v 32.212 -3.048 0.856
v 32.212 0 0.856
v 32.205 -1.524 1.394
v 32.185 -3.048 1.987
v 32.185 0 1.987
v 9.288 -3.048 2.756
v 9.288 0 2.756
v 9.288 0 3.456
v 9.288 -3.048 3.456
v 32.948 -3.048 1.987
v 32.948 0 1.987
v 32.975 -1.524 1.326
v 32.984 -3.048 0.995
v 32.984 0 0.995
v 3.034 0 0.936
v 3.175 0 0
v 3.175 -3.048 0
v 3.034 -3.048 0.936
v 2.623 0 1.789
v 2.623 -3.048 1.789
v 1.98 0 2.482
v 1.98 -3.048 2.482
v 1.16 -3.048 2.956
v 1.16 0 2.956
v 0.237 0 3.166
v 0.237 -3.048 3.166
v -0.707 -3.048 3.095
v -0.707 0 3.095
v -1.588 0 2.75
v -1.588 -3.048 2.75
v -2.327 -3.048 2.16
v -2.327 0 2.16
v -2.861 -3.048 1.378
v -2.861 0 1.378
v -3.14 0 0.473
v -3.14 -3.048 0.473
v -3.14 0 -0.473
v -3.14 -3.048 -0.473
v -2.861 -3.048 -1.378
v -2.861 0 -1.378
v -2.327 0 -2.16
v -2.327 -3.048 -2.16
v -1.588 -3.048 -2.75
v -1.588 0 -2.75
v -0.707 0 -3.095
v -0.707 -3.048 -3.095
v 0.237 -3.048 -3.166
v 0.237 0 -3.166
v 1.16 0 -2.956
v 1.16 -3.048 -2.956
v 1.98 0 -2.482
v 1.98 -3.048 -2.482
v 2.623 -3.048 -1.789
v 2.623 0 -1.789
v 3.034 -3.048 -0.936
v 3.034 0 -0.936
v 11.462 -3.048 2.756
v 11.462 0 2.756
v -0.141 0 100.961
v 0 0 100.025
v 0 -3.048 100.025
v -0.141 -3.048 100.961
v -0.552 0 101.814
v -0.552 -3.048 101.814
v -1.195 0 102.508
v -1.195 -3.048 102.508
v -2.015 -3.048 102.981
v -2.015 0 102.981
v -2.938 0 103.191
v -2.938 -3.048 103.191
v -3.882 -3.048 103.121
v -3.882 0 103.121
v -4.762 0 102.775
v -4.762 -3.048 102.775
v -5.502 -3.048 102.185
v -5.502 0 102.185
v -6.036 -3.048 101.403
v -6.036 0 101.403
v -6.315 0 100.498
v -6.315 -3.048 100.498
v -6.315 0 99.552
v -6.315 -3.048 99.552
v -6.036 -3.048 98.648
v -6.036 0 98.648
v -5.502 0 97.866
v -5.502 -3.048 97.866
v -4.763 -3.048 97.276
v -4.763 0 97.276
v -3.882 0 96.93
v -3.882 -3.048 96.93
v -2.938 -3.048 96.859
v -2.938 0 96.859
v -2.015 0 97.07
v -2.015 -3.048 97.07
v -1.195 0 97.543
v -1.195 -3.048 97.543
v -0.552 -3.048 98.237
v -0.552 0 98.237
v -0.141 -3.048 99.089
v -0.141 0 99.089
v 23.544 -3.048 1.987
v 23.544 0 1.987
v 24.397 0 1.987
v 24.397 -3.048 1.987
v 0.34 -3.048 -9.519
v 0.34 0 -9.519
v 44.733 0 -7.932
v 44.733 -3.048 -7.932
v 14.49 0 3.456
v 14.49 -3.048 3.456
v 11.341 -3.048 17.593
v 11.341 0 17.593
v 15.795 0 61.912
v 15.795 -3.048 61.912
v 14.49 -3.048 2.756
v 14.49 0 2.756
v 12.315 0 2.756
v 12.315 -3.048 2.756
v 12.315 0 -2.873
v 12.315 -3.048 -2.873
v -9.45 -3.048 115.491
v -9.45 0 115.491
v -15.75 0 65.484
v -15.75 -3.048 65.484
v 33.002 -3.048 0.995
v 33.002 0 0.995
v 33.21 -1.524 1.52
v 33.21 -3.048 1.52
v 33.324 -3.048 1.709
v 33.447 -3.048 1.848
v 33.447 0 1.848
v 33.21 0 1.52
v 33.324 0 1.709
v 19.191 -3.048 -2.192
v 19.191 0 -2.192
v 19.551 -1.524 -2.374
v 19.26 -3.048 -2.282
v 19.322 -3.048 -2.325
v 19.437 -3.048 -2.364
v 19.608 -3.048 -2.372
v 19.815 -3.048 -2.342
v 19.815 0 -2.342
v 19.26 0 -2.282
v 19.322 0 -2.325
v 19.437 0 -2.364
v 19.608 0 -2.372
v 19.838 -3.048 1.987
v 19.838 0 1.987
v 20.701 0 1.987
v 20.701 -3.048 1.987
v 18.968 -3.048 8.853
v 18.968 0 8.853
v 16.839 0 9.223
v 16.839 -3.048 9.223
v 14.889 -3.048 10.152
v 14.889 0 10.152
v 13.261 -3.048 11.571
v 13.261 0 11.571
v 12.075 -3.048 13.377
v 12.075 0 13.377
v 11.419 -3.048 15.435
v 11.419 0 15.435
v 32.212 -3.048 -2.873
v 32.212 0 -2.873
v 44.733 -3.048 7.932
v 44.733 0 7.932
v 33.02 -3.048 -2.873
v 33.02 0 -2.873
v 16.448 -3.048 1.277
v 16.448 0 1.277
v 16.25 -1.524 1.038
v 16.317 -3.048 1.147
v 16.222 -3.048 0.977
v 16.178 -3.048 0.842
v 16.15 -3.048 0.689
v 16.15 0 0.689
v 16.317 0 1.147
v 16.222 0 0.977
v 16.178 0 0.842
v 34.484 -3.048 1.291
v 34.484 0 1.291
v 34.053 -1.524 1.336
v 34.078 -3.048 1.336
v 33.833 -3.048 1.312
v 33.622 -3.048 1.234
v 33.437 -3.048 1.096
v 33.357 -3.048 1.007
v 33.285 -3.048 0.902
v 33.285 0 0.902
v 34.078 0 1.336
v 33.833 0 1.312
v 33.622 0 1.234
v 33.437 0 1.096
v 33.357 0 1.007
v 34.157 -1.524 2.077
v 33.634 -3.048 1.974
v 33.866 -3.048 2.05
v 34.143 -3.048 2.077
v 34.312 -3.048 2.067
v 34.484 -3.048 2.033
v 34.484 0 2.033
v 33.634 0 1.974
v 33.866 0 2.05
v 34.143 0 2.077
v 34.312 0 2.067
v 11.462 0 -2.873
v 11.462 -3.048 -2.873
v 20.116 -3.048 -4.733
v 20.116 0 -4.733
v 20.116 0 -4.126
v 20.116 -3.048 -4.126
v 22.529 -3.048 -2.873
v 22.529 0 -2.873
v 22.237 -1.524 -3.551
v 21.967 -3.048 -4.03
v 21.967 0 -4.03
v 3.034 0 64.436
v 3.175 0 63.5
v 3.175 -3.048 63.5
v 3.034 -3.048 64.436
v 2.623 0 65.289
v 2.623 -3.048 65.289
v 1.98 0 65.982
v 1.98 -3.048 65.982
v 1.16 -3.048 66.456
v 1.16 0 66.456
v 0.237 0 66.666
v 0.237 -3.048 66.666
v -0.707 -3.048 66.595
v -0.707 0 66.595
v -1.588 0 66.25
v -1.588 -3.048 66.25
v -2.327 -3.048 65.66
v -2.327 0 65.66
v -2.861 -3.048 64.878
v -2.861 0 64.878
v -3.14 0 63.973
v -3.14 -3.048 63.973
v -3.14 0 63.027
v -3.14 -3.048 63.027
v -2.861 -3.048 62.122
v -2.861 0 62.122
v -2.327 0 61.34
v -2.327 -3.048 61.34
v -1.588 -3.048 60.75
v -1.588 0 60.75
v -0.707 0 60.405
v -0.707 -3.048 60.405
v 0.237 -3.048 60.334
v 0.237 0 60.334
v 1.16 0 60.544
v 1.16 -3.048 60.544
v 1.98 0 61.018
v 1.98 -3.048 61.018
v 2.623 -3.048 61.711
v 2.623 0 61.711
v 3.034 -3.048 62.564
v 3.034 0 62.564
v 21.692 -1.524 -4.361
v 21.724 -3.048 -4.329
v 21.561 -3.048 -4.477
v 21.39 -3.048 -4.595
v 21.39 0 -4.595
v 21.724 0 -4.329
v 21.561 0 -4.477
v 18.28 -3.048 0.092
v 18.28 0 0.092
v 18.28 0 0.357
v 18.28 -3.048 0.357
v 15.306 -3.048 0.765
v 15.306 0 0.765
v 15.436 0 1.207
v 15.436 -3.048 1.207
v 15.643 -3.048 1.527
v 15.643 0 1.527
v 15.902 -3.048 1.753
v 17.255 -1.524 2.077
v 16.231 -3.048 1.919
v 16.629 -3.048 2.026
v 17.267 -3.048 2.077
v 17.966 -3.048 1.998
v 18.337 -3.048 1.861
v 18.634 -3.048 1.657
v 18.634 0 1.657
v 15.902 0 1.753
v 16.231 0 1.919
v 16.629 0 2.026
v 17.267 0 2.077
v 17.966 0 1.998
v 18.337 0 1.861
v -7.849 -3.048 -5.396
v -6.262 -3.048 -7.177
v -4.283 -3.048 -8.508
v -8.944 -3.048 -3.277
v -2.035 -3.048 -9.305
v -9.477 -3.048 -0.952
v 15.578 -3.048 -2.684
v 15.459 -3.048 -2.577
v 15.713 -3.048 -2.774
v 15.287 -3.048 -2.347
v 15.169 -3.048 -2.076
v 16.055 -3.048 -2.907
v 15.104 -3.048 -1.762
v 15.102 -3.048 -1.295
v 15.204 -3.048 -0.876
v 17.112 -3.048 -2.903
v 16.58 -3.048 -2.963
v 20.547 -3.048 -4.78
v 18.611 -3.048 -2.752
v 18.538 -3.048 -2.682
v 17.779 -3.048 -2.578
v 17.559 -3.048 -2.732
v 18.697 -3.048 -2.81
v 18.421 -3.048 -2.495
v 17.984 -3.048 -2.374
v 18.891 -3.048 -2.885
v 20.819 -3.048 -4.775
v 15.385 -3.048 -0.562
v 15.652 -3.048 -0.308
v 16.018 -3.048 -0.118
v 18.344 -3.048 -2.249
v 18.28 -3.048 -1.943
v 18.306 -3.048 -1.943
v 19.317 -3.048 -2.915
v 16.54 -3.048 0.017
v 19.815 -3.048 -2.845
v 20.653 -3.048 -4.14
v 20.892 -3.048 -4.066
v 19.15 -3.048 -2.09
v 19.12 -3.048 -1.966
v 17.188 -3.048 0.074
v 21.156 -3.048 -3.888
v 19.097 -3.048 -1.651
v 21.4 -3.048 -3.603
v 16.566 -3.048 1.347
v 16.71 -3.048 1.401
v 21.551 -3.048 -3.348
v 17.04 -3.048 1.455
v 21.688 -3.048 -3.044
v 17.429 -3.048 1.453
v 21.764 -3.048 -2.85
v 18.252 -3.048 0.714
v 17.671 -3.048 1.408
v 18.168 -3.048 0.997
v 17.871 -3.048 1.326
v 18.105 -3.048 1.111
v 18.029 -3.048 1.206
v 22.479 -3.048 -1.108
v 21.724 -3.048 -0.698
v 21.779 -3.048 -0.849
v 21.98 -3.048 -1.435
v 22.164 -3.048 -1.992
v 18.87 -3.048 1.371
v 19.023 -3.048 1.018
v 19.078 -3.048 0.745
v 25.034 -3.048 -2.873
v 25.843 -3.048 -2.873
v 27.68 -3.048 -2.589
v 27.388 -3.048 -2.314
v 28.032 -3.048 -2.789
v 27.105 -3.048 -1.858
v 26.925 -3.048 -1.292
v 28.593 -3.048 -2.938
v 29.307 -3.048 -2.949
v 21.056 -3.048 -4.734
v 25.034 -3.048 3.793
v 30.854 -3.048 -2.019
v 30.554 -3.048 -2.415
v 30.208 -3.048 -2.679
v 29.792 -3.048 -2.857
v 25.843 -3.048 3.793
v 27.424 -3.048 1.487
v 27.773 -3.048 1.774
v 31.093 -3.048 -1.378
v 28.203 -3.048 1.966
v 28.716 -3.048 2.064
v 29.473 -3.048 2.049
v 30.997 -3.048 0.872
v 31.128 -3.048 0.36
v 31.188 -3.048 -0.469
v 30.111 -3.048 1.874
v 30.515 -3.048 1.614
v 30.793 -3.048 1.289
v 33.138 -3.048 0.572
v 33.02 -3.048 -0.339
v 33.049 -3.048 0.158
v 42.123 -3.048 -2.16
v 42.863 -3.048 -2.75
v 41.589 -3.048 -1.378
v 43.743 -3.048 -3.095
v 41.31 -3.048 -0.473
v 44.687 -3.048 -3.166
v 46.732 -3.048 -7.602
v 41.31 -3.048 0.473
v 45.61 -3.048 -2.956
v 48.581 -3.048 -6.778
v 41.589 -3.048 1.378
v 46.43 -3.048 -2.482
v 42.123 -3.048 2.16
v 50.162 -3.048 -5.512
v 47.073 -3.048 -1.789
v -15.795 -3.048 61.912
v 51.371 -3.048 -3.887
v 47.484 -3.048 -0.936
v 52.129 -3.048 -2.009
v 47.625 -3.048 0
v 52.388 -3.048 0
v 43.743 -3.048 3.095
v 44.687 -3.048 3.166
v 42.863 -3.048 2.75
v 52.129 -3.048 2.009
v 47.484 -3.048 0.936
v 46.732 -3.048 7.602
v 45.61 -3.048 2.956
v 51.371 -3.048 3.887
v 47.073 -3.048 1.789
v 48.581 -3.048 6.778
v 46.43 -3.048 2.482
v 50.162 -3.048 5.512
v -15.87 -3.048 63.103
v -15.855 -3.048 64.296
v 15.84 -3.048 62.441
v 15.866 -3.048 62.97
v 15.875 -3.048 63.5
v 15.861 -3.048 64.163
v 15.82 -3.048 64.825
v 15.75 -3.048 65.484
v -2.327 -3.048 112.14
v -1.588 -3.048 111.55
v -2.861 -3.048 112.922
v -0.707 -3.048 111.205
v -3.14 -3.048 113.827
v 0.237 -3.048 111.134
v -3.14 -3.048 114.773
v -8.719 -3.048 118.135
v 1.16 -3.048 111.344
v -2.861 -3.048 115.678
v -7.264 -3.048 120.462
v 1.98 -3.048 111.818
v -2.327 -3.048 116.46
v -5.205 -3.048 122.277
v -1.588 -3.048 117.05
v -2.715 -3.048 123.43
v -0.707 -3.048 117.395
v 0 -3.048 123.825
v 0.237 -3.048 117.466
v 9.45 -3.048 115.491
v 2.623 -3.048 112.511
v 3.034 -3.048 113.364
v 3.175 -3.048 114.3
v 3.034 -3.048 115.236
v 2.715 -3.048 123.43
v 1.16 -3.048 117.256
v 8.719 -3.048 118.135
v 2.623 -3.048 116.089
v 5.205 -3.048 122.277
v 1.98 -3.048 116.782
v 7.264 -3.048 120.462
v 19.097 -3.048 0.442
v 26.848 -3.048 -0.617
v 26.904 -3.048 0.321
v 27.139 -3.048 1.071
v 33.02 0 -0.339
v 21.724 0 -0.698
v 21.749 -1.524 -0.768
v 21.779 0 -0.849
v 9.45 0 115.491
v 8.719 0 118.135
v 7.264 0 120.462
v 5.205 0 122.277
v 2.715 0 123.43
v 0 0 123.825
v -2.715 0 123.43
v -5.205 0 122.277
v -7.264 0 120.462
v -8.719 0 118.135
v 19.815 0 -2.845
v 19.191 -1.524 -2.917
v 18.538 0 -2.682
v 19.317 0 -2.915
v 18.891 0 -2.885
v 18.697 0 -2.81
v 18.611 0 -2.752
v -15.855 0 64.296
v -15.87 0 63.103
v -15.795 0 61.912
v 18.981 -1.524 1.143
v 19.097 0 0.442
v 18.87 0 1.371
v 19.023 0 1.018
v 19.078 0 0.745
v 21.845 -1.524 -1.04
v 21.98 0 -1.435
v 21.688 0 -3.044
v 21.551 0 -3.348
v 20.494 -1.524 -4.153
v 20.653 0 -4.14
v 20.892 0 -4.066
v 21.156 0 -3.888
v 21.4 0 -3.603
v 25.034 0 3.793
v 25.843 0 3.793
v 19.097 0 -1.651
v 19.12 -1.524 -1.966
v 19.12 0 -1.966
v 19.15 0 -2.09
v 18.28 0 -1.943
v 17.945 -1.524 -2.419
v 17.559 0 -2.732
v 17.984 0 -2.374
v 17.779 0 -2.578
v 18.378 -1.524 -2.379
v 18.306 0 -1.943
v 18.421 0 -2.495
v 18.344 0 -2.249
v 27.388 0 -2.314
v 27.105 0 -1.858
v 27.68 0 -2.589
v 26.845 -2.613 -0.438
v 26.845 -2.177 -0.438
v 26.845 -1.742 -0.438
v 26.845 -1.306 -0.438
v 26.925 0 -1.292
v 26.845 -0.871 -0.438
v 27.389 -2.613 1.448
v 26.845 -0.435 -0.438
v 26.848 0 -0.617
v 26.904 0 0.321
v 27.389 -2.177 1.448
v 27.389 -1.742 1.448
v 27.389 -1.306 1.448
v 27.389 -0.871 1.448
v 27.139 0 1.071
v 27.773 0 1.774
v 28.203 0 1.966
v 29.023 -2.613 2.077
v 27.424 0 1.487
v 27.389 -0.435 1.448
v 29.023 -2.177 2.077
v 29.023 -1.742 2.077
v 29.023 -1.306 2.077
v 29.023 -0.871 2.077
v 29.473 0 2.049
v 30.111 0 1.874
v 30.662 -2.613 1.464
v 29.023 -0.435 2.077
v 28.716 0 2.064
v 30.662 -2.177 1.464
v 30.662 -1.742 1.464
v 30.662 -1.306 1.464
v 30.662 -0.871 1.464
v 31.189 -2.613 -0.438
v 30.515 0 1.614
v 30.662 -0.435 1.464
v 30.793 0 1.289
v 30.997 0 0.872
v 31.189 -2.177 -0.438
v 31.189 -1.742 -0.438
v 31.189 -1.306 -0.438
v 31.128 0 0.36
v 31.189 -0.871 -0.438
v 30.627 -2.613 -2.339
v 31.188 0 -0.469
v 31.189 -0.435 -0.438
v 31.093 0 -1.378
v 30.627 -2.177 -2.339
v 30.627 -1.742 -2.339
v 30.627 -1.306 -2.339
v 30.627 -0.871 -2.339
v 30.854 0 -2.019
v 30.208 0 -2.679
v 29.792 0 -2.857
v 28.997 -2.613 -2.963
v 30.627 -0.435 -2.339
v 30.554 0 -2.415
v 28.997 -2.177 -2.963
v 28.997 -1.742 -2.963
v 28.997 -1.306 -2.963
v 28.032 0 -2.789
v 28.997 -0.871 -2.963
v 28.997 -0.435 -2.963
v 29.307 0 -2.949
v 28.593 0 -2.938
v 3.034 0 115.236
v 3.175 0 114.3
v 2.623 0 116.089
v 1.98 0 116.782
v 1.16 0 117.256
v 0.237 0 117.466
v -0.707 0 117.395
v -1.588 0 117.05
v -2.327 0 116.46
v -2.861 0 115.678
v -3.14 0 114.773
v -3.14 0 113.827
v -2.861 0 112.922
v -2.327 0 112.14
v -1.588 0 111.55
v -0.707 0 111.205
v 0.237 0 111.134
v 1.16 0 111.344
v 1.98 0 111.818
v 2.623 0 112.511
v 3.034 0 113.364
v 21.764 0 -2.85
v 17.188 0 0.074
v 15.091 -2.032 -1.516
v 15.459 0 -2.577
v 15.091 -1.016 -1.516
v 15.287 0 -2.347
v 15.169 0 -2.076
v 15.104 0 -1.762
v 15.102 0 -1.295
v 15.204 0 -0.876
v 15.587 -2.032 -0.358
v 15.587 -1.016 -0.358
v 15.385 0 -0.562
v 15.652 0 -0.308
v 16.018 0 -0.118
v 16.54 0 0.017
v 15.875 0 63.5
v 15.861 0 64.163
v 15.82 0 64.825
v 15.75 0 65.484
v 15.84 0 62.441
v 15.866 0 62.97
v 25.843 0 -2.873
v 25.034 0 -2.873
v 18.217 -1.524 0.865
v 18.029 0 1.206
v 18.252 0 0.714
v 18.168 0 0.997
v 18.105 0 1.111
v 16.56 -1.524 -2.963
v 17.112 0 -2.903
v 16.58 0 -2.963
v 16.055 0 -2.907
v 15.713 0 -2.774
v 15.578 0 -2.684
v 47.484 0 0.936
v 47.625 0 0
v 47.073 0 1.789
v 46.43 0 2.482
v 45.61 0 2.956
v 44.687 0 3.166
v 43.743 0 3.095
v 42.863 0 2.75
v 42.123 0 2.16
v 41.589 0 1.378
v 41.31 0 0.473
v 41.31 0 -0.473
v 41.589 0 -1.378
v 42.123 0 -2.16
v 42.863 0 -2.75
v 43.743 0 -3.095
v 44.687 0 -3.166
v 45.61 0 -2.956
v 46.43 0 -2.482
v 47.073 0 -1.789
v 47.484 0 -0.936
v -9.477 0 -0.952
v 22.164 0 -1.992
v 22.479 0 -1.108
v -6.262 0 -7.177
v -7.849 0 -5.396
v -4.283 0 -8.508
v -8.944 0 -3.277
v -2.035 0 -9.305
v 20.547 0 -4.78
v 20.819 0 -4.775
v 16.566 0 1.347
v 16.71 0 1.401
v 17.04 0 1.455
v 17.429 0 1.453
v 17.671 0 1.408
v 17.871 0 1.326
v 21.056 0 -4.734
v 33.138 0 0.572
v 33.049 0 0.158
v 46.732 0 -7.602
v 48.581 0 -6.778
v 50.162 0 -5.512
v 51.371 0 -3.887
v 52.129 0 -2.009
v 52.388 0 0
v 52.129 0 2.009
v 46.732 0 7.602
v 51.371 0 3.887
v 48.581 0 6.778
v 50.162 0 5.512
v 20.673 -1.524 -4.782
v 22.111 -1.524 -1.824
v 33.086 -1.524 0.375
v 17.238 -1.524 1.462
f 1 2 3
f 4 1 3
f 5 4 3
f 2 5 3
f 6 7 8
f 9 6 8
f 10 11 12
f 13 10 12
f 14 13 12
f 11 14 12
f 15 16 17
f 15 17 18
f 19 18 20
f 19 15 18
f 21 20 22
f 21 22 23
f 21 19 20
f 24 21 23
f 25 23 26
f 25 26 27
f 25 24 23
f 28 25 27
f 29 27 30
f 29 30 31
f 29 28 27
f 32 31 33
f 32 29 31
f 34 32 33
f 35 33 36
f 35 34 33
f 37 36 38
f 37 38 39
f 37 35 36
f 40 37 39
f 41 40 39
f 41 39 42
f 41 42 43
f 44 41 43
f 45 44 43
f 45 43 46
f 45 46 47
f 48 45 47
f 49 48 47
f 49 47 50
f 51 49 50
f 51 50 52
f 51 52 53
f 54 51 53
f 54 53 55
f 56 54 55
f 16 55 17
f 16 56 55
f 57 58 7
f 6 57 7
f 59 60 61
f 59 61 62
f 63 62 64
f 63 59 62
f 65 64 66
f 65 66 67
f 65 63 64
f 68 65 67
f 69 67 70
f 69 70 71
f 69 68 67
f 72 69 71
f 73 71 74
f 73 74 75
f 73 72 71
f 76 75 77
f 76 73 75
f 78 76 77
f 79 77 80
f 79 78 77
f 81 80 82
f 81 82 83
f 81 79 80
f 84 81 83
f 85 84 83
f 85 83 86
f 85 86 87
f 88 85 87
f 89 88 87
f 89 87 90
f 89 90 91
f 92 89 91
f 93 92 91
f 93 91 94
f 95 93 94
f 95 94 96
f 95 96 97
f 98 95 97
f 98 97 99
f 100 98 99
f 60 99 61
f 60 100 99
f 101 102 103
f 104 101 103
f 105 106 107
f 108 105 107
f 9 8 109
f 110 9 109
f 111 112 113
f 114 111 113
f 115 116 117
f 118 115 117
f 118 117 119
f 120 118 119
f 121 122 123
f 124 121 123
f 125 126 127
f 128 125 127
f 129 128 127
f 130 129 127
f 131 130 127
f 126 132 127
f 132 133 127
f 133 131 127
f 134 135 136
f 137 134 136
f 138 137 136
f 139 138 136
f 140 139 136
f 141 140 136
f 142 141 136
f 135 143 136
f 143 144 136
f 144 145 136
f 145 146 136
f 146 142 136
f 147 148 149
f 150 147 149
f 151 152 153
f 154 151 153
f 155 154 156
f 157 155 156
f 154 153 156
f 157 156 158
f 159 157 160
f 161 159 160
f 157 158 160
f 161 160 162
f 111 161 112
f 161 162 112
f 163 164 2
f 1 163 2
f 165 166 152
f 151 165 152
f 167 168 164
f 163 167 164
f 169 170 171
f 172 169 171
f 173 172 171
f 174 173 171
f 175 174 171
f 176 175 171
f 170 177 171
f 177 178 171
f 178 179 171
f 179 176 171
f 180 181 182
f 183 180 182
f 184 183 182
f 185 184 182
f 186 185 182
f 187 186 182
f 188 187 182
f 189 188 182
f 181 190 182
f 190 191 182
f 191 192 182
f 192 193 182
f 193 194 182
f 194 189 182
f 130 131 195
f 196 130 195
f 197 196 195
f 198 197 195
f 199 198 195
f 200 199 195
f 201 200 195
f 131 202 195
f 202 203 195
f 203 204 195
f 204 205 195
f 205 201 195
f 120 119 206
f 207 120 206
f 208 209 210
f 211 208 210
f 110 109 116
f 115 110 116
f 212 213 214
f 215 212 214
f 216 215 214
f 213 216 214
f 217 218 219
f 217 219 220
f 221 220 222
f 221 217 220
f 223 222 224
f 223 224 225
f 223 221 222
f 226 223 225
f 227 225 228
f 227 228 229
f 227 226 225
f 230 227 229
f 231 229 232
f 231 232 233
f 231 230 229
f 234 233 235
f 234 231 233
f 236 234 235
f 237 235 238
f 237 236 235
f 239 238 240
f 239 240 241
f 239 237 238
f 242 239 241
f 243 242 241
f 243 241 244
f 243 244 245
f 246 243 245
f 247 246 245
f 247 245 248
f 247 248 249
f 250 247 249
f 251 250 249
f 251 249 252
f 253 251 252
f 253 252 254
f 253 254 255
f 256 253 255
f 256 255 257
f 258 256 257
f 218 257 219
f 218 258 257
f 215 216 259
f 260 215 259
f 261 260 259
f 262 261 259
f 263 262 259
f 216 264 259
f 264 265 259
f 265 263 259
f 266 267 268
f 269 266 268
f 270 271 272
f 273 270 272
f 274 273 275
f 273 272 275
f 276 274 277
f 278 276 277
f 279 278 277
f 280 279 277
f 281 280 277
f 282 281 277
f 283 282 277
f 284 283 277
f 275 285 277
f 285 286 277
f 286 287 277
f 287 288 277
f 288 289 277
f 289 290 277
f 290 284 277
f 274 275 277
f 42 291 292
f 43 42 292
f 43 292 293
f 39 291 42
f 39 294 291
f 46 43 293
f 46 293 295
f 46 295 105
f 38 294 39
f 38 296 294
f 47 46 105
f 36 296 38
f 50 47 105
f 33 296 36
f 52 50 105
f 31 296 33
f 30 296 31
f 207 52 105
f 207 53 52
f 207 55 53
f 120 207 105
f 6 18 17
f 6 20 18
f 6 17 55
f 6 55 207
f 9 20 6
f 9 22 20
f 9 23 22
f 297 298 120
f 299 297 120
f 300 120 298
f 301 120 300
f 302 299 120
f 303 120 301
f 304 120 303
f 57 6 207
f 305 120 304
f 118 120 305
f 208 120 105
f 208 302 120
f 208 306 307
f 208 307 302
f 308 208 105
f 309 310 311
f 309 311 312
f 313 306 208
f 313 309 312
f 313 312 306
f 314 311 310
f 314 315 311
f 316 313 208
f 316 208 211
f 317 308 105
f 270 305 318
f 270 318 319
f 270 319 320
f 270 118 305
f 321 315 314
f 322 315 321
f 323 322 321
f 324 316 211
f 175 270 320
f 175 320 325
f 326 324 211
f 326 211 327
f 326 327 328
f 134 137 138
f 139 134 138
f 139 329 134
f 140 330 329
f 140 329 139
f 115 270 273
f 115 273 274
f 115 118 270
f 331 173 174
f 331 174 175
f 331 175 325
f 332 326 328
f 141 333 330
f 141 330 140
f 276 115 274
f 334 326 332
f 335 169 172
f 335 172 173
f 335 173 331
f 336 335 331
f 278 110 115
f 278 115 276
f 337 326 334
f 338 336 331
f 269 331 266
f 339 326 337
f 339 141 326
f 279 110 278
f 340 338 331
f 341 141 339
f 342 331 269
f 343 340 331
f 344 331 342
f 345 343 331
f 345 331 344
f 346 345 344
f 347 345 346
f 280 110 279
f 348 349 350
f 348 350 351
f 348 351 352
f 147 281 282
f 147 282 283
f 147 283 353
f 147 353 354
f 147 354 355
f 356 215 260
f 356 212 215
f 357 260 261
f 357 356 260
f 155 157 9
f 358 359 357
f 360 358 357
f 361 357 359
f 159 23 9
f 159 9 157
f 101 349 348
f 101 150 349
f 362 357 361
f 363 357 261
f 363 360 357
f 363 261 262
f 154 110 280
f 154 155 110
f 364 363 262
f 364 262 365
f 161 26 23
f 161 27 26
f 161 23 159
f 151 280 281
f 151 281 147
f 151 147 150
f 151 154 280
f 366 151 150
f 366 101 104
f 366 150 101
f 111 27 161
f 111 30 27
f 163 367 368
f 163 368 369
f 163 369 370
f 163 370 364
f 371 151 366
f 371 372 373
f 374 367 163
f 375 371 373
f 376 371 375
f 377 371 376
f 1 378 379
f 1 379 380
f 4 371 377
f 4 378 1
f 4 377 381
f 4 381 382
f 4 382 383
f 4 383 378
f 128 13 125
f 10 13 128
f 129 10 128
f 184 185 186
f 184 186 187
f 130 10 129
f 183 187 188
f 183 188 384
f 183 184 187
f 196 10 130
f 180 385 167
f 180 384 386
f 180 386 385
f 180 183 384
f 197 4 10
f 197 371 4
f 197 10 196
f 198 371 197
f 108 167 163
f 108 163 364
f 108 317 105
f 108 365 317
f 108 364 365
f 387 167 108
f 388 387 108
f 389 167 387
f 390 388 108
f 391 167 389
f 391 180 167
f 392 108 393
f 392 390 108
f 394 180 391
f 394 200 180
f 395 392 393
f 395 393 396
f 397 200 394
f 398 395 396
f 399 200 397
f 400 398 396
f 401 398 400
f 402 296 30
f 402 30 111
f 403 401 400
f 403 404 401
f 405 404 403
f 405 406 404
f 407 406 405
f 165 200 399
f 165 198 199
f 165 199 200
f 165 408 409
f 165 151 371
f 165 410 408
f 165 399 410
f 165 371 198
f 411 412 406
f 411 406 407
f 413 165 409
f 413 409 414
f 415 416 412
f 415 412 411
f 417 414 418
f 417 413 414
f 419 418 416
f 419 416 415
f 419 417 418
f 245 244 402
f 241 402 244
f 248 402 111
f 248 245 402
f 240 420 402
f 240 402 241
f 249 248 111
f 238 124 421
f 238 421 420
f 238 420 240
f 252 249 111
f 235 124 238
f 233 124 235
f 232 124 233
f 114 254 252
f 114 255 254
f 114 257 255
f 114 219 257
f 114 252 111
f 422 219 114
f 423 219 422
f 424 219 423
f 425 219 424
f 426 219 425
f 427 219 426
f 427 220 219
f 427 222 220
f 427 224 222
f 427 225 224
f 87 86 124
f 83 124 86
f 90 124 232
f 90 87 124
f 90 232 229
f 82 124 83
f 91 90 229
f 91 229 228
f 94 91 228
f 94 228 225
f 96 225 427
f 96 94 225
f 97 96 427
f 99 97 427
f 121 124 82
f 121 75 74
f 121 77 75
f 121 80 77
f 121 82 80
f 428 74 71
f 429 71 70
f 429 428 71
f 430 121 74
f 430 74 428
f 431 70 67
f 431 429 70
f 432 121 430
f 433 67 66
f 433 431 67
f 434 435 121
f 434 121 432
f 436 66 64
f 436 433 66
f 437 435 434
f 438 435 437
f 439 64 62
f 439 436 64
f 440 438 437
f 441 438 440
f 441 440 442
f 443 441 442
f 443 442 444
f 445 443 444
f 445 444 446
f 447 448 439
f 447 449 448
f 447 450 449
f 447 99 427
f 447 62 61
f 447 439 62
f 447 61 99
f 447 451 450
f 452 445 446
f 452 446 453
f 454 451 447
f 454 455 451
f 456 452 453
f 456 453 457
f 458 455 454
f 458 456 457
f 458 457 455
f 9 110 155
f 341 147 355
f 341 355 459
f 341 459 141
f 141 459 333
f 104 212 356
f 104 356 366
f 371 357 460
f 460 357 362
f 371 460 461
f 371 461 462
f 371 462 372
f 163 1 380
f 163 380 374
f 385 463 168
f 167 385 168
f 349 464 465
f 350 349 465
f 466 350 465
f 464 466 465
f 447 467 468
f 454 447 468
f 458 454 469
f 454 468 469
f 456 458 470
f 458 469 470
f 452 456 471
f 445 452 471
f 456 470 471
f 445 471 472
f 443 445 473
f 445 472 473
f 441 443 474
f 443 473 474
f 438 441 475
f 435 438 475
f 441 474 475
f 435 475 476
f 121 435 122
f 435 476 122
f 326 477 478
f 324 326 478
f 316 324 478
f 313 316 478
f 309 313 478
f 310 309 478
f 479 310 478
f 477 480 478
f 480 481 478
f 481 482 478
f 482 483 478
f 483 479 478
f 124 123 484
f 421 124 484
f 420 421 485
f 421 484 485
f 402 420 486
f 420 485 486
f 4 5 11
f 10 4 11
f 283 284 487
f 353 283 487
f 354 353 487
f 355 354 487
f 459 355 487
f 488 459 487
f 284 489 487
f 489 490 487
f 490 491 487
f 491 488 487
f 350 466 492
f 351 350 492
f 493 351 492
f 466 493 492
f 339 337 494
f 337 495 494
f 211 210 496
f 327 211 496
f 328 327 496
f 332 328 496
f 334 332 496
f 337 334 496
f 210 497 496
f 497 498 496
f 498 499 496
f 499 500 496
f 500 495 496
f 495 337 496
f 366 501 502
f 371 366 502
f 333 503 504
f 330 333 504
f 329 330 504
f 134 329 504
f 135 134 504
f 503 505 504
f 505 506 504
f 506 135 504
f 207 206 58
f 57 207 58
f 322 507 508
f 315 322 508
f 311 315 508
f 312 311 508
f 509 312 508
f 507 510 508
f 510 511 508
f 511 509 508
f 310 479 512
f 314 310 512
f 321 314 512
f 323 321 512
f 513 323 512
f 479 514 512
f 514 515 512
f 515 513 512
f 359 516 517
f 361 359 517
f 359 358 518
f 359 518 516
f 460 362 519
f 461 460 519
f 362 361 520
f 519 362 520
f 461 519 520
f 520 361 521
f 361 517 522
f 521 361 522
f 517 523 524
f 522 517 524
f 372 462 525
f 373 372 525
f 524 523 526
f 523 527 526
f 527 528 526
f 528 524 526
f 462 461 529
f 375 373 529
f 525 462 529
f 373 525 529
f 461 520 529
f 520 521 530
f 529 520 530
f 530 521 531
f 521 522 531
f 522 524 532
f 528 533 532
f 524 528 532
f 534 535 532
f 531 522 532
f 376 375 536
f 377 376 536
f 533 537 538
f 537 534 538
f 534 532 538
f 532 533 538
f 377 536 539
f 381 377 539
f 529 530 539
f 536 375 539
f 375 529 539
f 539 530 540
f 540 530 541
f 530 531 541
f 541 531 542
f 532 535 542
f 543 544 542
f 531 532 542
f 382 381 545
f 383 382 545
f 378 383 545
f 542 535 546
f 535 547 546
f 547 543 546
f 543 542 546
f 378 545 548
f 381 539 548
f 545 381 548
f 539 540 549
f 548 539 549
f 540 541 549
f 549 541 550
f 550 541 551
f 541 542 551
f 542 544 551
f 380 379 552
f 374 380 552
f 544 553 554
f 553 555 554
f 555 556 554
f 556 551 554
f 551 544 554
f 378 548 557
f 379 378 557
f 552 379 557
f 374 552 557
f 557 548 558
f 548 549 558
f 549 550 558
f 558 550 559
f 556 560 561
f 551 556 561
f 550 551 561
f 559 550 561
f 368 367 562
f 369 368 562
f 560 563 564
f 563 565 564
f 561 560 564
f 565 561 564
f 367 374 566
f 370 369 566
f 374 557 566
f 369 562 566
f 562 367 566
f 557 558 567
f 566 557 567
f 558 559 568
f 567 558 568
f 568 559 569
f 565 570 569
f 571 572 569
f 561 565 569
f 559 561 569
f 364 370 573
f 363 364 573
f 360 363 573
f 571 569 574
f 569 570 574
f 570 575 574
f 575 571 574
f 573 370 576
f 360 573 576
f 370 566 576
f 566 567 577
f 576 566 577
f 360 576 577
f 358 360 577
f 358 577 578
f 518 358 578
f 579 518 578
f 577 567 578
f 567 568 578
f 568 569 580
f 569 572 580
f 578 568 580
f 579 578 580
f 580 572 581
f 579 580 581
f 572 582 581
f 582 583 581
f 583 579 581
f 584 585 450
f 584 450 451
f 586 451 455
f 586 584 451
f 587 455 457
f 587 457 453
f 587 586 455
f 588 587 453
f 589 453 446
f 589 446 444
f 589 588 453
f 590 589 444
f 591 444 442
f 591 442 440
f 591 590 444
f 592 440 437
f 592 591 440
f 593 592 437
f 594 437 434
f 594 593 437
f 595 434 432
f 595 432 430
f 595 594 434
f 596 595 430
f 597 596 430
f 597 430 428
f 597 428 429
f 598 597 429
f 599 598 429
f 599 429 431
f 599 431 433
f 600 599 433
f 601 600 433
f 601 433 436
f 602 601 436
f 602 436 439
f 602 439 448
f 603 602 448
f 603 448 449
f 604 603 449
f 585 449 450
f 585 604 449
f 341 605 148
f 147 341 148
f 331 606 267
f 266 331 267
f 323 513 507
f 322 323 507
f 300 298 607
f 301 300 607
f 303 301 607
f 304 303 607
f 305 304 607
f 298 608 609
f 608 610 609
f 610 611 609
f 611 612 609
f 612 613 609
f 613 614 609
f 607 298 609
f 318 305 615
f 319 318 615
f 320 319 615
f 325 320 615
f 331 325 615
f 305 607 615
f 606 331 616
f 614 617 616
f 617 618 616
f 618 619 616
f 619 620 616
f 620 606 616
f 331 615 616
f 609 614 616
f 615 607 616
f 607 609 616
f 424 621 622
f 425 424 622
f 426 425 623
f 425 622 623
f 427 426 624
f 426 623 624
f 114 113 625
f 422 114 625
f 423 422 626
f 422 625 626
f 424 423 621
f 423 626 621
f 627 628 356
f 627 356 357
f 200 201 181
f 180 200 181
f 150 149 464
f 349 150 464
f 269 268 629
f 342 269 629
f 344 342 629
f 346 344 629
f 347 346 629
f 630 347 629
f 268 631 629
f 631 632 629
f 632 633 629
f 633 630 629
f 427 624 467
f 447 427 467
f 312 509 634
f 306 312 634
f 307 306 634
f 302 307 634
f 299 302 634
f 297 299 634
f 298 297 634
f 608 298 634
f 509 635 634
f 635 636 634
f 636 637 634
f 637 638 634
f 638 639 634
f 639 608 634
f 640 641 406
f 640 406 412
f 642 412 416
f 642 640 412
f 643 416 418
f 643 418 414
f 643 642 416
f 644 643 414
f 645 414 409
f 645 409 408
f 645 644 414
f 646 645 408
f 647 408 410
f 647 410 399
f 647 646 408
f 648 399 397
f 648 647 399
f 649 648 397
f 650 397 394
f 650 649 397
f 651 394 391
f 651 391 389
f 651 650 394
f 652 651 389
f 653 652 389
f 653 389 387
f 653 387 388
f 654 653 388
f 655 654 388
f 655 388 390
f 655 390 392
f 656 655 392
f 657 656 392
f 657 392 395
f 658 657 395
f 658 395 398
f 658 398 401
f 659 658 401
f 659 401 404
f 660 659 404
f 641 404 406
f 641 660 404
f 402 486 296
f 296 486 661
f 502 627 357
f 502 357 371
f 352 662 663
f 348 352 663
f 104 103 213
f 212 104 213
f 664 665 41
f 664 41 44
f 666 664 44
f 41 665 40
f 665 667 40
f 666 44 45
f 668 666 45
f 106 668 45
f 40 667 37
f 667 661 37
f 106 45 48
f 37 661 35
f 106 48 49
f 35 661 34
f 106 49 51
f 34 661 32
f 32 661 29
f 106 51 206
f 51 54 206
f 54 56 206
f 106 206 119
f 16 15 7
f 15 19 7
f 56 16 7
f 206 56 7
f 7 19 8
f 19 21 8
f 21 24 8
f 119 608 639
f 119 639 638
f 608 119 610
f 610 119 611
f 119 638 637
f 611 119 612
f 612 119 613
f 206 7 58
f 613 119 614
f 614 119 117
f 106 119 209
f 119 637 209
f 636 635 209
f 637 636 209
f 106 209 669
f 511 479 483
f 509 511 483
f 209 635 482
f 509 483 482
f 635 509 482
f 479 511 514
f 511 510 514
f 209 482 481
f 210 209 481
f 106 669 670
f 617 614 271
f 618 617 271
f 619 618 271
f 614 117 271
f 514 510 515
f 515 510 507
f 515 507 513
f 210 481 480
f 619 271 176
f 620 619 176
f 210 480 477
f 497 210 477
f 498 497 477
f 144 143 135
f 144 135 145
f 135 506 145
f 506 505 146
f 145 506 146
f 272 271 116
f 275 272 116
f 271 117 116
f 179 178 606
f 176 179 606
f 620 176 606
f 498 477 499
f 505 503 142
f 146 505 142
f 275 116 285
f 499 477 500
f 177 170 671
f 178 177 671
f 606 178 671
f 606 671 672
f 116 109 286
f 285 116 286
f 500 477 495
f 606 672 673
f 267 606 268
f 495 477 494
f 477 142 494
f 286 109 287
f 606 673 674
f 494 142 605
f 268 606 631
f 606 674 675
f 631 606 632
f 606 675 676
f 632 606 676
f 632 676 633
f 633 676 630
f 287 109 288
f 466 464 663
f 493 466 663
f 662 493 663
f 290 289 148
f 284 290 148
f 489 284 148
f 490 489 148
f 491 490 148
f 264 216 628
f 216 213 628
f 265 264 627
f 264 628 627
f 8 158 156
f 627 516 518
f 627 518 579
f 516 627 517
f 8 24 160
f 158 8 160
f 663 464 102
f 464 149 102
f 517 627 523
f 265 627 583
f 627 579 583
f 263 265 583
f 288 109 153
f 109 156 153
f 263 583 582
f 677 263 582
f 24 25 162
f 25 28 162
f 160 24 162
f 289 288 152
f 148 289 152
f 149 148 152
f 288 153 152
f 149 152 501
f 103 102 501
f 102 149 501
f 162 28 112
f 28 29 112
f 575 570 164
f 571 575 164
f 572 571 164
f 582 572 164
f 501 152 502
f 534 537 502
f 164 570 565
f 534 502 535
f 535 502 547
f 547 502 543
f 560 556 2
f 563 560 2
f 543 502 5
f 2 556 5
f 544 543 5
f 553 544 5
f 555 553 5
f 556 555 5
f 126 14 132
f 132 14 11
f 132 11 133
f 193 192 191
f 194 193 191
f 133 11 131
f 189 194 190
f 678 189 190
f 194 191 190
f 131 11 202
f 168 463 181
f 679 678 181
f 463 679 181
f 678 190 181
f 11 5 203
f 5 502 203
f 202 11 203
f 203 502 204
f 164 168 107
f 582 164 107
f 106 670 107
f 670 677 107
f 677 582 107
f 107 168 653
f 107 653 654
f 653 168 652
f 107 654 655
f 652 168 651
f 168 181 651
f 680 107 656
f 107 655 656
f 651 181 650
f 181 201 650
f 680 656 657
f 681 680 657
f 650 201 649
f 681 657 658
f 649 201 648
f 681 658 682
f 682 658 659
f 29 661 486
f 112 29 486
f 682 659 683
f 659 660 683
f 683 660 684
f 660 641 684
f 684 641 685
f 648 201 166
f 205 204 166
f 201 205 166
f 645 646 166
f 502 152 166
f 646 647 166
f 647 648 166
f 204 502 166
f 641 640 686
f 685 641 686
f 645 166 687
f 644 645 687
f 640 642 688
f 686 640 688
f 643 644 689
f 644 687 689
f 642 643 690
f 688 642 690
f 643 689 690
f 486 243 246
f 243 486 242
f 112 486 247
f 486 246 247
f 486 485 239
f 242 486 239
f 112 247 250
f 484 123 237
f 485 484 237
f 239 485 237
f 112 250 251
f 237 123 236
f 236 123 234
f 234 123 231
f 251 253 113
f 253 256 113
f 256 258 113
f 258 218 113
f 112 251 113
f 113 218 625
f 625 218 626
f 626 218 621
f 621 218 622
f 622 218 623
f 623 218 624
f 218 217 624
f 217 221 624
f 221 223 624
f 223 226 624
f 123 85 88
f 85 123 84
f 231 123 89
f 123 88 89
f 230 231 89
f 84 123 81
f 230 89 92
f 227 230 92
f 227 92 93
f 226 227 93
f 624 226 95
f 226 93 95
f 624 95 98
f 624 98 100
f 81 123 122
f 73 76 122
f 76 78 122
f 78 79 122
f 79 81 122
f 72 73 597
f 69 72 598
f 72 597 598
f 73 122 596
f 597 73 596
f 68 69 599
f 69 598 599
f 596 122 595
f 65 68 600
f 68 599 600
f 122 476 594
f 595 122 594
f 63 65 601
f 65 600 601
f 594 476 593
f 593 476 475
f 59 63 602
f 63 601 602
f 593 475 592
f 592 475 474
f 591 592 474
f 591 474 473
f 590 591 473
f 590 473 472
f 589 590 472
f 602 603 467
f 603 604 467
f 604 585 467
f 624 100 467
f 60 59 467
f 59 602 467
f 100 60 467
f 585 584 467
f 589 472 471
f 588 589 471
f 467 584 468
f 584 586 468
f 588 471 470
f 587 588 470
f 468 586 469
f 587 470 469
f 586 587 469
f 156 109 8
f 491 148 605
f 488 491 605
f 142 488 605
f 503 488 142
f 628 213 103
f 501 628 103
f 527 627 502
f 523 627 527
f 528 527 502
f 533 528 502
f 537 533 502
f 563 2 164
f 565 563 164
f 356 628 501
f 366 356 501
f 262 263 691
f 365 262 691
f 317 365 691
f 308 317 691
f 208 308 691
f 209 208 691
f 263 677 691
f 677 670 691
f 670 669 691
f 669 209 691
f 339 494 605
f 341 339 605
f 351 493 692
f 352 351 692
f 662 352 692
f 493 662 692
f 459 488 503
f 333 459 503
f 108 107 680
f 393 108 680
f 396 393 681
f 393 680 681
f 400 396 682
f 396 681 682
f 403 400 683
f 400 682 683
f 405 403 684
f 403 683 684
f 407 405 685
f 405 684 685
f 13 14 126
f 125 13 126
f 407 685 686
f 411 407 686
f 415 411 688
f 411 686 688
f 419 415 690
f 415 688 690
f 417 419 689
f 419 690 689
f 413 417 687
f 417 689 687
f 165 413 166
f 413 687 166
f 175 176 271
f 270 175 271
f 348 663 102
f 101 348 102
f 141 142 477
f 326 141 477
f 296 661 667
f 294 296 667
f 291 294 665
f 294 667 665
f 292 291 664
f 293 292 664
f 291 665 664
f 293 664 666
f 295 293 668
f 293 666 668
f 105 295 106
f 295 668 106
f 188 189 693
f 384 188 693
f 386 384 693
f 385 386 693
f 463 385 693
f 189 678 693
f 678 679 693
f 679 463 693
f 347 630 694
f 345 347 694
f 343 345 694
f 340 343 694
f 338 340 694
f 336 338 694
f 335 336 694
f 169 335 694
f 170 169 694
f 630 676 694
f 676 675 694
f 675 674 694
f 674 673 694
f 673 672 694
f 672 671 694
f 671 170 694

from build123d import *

# Parameters (mm, degrees)
F0_R     = 3.175
F0_W     = 0.8091993024
F0_H     = 6.6661924771
F1_DEPTH = 3.048


with BuildPart() as f1:
    # F0 (on Front) → F1 (new body)
    with BuildSketch(Plane.XZ):
        with BuildLine():
            ThreePointArc((44.7334821429, -7.9324362036), (50.1620069047, -5.5115227815), (52.3875, 0))
            ThreePointArc((52.3875, 0), (50.1620069047, 5.5115227815), (44.7334821429, 7.9324362036))
            ThreePointArc((44.7334821429, 7.9324362036), (36.5125, 0), (44.7334821429, -7.9324362036))
        make_face()
        with Locations((44.45, 0)):
            Circle(F0_R, mode=Mode.SUBTRACT)
        with BuildLine():
            ThreePointArc((44.7334821429, -7.9324362036), (36.5125, 0), (44.7334821429, 7.9324362036))
            Line((44.7334821429, 7.9324362036), (18.9676000005, 8.8532337108))
            ThreePointArc((18.9676000005, 8.8532337108), (13.2611998974, 11.5713591498), (11.3411865923, 17.5933818124))
            Line((11.3411865923, 17.5933818124), (15.7954255641, 61.9125))
            ThreePointArc((15.7954255641, 61.9125), (0, 47.625), (-15.7954255641, 61.9125))
            Line((-15.7954255641, 61.9125), (-9.4772553384, -0.9525))
            ThreePointArc((-9.4772553384, -0.9525), (-0.4768479324, 9.5130563464), (9.525, 0))
            ThreePointArc((9.525, 0), (6.8544082857, -6.6138273378), (0.3401785714, -9.5189234444))
            Line((0.3401785714, -9.5189234444), (44.7334821429, -7.9324362036))
        make_face()
        Polygon((14.4900061593, 2.7556789248), (12.3153728652, 2.7556789248), (12.3153728652, -2.8727837186), (11.4616172957, -2.8727837186), (11.4616172957, 2.7556789248), (9.2884213006, 2.7556789248), (9.2884213006, 3.4556435079), (14.4900061593, 3.4556435079), align=None, mode=Mode.SUBTRACT)
        with BuildLine():
            add(Edge.make_bspline(
                [(17.5586393932, -2.7319284226), (17.1475718967, -2.9633335517), (16.5597166308, -2.9633335517)],
                knots=[0, 0, 0, 1, 1, 1], degree=2))
            add(Edge.make_bspline(
                [(16.5597166308, -2.9633335517), (15.8266941722, -2.9633335517), (15.4587456439, -2.5767001373)],
                knots=[0, 0, 0, 1, 1, 1], degree=2))
            add(Edge.make_bspline(
                [(15.4587456439, -2.5767001373), (15.0907971156, -2.1900667228), (15.0907971156, -1.5159735206)],
                knots=[0, 0, 0, 1, 1, 1], degree=2))
            add(Edge.make_bspline(
                [(15.0907971156, -1.5159735206), (15.0907971156, -0.7613915778), (15.5873838989, -0.3575105761)],
                knots=[0, 0, 0, 1, 1, 1], degree=2))
            add(Edge.make_bspline(
                [(15.5873838989, -0.3575105761), (16.0839706822, 0.0463704256), (17.187816267, 0.0736791055)],
                knots=[0, 0, 0, 1, 1, 1], degree=2))
            Line((17.187816267, 0.0736791055), (18.2801634603, 0.0923639917))
            Line((18.2801634603, 0.0923639917), (18.2801634603, 0.3568269964))
            add(Edge.make_bspline(
                [(18.2801634603, 0.3568269964), (18.2801634603, 0.9489941591), (18.0286361461, 1.2055520196)],
                knots=[0, 0, 0, 1, 1, 1], degree=2))
            add(Edge.make_bspline(
                [(18.0286361461, 1.2055520196), (17.7771088318, 1.4621098801), (17.2381217298, 1.4621098801)],
                knots=[0, 0, 0, 1, 1, 1], degree=2))
            add(Edge.make_bspline(
                [(17.2381217298, 1.4621098801), (16.6948227311, 1.4621098801), (16.4476073136, 1.2774169665)],
                knots=[0, 0, 0, 1, 1, 1], degree=2))
            add(Edge.make_bspline(
                [(16.4476073136, 1.2774169665), (16.2003918962, 1.0927240529), (16.1500864334, 0.6888430512)],
                knots=[0, 0, 0, 1, 1, 1], degree=2))
            Line((16.1500864334, 0.6888430512), (15.3063919564, 0.7650198949))
            add(Edge.make_bspline(
                [(15.3063919564, 0.7650198949), (15.5133630036, 2.0772738258), (17.2553693171, 2.0772738258)],
                knots=[0, 0, 0, 1, 1, 1], degree=2))
            add(Edge.make_bspline(
                [(17.2553693171, 2.0772738258), (18.1723660399, 2.0772738258), (18.6344576487, 1.6568638863)],
                knots=[0, 0, 0, 1, 1, 1], degree=2))
            add(Edge.make_bspline(
                [(18.6344576487, 1.6568638863), (19.0965492574, 1.2364539468), (19.0965492574, 0.4416276337)],
                knots=[0, 0, 0, 1, 1, 1], degree=2))
            Line((19.0965492574, 0.4416276337), (19.0965492574, -1.6510796208))
            add(Edge.make_bspline(
                [(19.0965492574, -1.6510796208), (19.0965492574, -2.0104043555), (19.1914109874, -2.1922226712)],
                knots=[0, 0, 0, 1, 1, 1], degree=2))
            add(Edge.make_bspline(
                [(19.1914109874, -2.1922226712), (19.2862727173, -2.3740409869), (19.550735722, -2.3740409869)],
                knots=[0, 0, 0, 1, 1, 1], degree=2))
            add(Edge.make_bspline(
                [(19.550735722, -2.3740409869), (19.667156936, -2.3740409869), (19.8151987267, -2.3424204103)],
                knots=[0, 0, 0, 1, 1, 1], degree=2))
            Line((19.8151987267, -2.3424204103), (19.8151987267, -2.8454750388))
            add(Edge.make_bspline(
                [(19.8151987267, -2.8454750388), (19.5104913517, -2.9173399857), (19.1914109874, -2.9173399857)],
                knots=[0, 0, 0, 1, 1, 1], degree=2))
            add(Edge.make_bspline(
                [(19.1914109874, -2.9173399857), (18.7429737185, -2.9173399857), (18.5381586198, -2.6816229598)],
                knots=[0, 0, 0, 1, 1, 1], degree=2))
            add(Edge.make_bspline(
                [(18.5381586198, -2.6816229598), (18.333343521, -2.4459059338), (18.3060348412, -1.9428513053)],
                knots=[0, 0, 0, 1, 1, 1], degree=2))
            Line((18.3060348412, -1.9428513053), (18.2801634603, -1.9428513053))
            add(Edge.make_bspline(
                [(18.2801634603, -1.9428513053), (17.9697068896, -2.5005232935), (17.5586393932, -2.7319284226)],
                knots=[0, 0, 0, 1, 1, 1], degree=2))
        make_face(mode=Mode.SUBTRACT)
        with BuildLine():
            add(Edge.make_bspline(
                [(21.3897597139, -4.5953864965), (21.072835298, -4.781516709), (20.673266193, -4.781516709)],
                knots=[0, 0, 0, 1, 1, 1], degree=2))
            add(Edge.make_bspline(
                [(20.673266193, -4.781516709), (20.3412501382, -4.781516709), (20.1155942049, -4.7326485451)],
                knots=[0, 0, 0, 1, 1, 1], degree=2))
            Line((20.1155942049, -4.7326485451), (20.1155942049, -4.126108393))
            add(Edge.make_bspline(
                [(20.1155942049, -4.126108393), (20.2866327786, -4.1534170729), (20.4936038257, -4.1534170729)],
                knots=[0, 0, 0, 1, 1, 1], degree=2))
            add(Edge.make_bspline(
                [(20.4936038257, -4.1534170729), (21.2481857685, -4.1534170729), (21.6879992437, -3.0438222923)],
                knots=[0, 0, 0, 1, 1, 1], degree=2))
            Line((21.6879992437, -3.0438222923), (21.7641760874, -2.8497869356))
            Line((21.7641760874, -2.8497869356), (19.8381955097, 1.9867239927))
            Line((19.8381955097, 1.9867239927), (20.7005748729, 1.9867239927))
            Line((20.7005748729, 1.9867239927), (21.7239317171, -0.6981504245))
            add(Edge.make_bspline(
                [(21.7239317171, -0.6981504245), (21.7469285001, -0.7613915778), (21.7785490768, -0.8490668131)],
                knots=[0, 0, 0, 1, 1, 1], degree=2))
            add(Edge.make_bspline(
                [(21.7785490768, -0.8490668131), (21.8101696534, -0.9367420483), (21.9804895777, -1.43548478)],
                knots=[0, 0, 0, 1, 1, 1], degree=2))
            add(Edge.make_bspline(
                [(21.9804895777, -1.43548478), (22.1508095019, -1.9342275117), (22.1637451923, -1.9917194693)],
                knots=[0, 0, 0, 1, 1, 1], degree=2))
            Line((22.1637451923, -1.9917194693), (22.4785136599, -1.107780622))
            Line((22.4785136599, -1.107780622), (23.5435521734, 1.9867239927))
            Line((23.5435521734, 1.9867239927), (24.3973077429, 1.9867239927))
            Line((24.3973077429, 1.9867239927), (22.5288191227, -2.8727837186))
            add(Edge.make_bspline(
                [(22.5288191227, -2.8727837186), (22.2269863456, -3.6503624444), (21.9668352377, -4.0298093641)],
                knots=[0, 0, 0, 1, 1, 1], degree=2))
            add(Edge.make_bspline(
                [(21.9668352377, -4.0298093641), (21.7066841299, -4.4092562839), (21.3897597139, -4.5953864965)],
                knots=[0, 0, 0, 1, 1, 1], degree=2))
        make_face(mode=Mode.SUBTRACT)
        with Locations((25.4386308239, 0.4603125199)):
            Rectangle(F0_W, F0_H, mode=Mode.SUBTRACT)
        with BuildLine():
            add(Edge.make_bspline(
                [(30.6624938161, 1.4642658285), (31.1885452276, 0.8512578312), (31.1885452276, -0.4379993167)],
                knots=[0, 0, 0, 1, 1, 1], degree=2))
            add(Edge.make_bspline(
                [(31.1885452276, -0.4379993167), (31.1885452276, -1.7143207741), (30.6265613426, -2.3388271629)],
                knots=[0, 0, 0, 1, 1, 1], degree=2))
            add(Edge.make_bspline(
                [(30.6265613426, -2.3388271629), (30.0645774576, -2.9633335517), (28.9966643463, -2.9633335517)],
                knots=[0, 0, 0, 1, 1, 1], degree=2))
            add(Edge.make_bspline(
                [(28.9966643463, -2.9633335517), (27.9316258328, -2.9633335517), (27.388326834, -2.3136744315)],
                knots=[0, 0, 0, 1, 1, 1], degree=2))
            add(Edge.make_bspline(
                [(27.388326834, -2.3136744315), (26.8450278353, -1.6640153113), (26.8450278353, -0.4379993167)],
                knots=[0, 0, 0, 1, 1, 1], degree=2))
            add(Edge.make_bspline(
                [(26.8450278353, -0.4379993167), (26.8450278353, 2.0772738258), (29.0225357272, 2.0772738258)],
                knots=[0, 0, 0, 1, 1, 1], degree=2))
            add(Edge.make_bspline(
                [(29.0225357272, 2.0772738258), (30.1364424046, 2.0772738258), (30.6624938161, 1.4642658285)],
                knots=[0, 0, 0, 1, 1, 1], degree=2))
        make_face(mode=Mode.SUBTRACT)
        with BuildLine():
            Line((33.0196640753, -2.8727837186), (32.2119020719, -2.8727837186))
            Line((32.2119020719, -2.8727837186), (32.2119020719, 0.8555697281))
            add(Edge.make_bspline(
                [(32.2119020719, 0.8555697281), (32.2119020719, 1.3672481502), (32.184593392, 1.9867239927)],
                knots=[0, 0, 0, 1, 1, 1], degree=2))
            Line((32.184593392, 1.9867239927), (32.9477991284, 1.9867239927))
            add(Edge.make_bspline(
                [(32.9477991284, 1.9867239927), (32.9837316019, 1.160277103), (32.9837316019, 0.9949877251)],
                knots=[0, 0, 0, 1, 1, 1], degree=2))
            Line((32.9837316019, 0.9949877251), (33.0024164881, 0.9949877251))
            add(Edge.make_bspline(
                [(33.0024164881, 0.9949877251), (33.1950145459, 1.6187754644), (33.4465418601, 1.8480246451)],
                knots=[0, 0, 0, 1, 1, 1], degree=2))
            add(Edge.make_bspline(
                [(33.4465418601, 1.8480246451), (33.6980691744, 2.0772738258), (34.1565675358, 2.0772738258)],
                knots=[0, 0, 0, 1, 1, 1], degree=2))
            add(Edge.make_bspline(
                [(34.1565675358, 2.0772738258), (34.3175450169, 2.0772738258), (34.4842716938, 2.0327175587)],
                knots=[0, 0, 0, 1, 1, 1], degree=2))
            Line((34.4842716938, 2.0327175587), (34.4842716938, 1.2910713064))
            add(Edge.make_bspline(
                [(34.4842716938, 1.2910713064), (34.3232942126, 1.3356275735), (34.0530820122, 1.3356275735)],
                knots=[0, 0, 0, 1, 1, 1], degree=2))
            add(Edge.make_bspline(
                [(34.0530820122, 1.3356275735), (33.5500273837, 1.3356275735), (33.2848457295, 0.9022819436)],
                knots=[0, 0, 0, 1, 1, 1], degree=2))
            add(Edge.make_bspline(
                [(33.2848457295, 0.9022819436), (33.0196640753, 0.4689363136), (33.0196640753, -0.3388256899)],
                knots=[0, 0, 0, 1, 1, 1], degree=2))
            Line((33.0196640753, -0.3388256899), (33.0196640753, -2.8727837186))
        make_face(mode=Mode.SUBTRACT)
        with BuildLine():
            ThreePointArc((-9.4772553384, -0.9525), (-6.2623833816, -7.1769199091), (0.3401785714, -9.5189234444))
            ThreePointArc((0.3401785714, -9.5189234444), (6.8544082857, -6.6138273378), (9.525, 0))
            ThreePointArc((9.525, 0), (-0.4768479324, 9.5130563464), (-9.4772553384, -0.9525))
        make_face()
        Circle(F0_R, mode=Mode.SUBTRACT)
        with BuildLine():
            ThreePointArc((-15.7954255641, 61.9125), (0, 47.625), (15.7954255641, 61.9125))
            ThreePointArc((15.7954255641, 61.9125), (15.8550939106, 62.7052534459), (15.875, 63.5))
            ThreePointArc((15.875, 63.5), (15.8438414904, 64.4941387366), (15.7504882737, 65.484375))
            ThreePointArc((15.7504882737, 65.484375), (0, 79.375), (-15.7504882737, 65.484375))
            ThreePointArc((-15.7504882737, 65.484375), (-15.8737438155, 63.6997054867), (-15.7954255641, 61.9125))
        make_face()
        with Locations((0, 63.5)):
            Circle(F0_R, mode=Mode.SUBTRACT)
        with BuildLine():
            Line((-9.4502929642, 115.490625), (-15.7504882737, 65.484375))
            ThreePointArc((-15.7504882737, 65.484375), (0, 79.375), (15.7504882737, 65.484375))
            Line((15.7504882737, 65.484375), (9.4502929642, 115.490625))
            ThreePointArc((9.4502929642, 115.490625), (9.5063048942, 114.896483242), (9.525, 114.3))
            ThreePointArc((9.525, 114.3), (-0.596483242, 104.7936951058), (-9.4502929642, 115.490625))
        make_face()
        with Locations((-3.175, 100.0252)):
            Circle(F0_R, mode=Mode.SUBTRACT)
        with BuildLine():
            ThreePointArc((9.4502929642, 115.490625), (0, 123.825), (-9.4502929642, 115.490625))
            ThreePointArc((-9.4502929642, 115.490625), (-0.596483242, 104.7936951058), (9.525, 114.3))
            ThreePointArc((9.525, 114.3), (9.5063048942, 114.896483242), (9.4502929642, 115.490625))
        make_face()
        with Locations((0, 114.3)):
            Circle(F0_R, mode=Mode.SUBTRACT)
    extrude(amount=F1_DEPTH)


solid = f1.part
